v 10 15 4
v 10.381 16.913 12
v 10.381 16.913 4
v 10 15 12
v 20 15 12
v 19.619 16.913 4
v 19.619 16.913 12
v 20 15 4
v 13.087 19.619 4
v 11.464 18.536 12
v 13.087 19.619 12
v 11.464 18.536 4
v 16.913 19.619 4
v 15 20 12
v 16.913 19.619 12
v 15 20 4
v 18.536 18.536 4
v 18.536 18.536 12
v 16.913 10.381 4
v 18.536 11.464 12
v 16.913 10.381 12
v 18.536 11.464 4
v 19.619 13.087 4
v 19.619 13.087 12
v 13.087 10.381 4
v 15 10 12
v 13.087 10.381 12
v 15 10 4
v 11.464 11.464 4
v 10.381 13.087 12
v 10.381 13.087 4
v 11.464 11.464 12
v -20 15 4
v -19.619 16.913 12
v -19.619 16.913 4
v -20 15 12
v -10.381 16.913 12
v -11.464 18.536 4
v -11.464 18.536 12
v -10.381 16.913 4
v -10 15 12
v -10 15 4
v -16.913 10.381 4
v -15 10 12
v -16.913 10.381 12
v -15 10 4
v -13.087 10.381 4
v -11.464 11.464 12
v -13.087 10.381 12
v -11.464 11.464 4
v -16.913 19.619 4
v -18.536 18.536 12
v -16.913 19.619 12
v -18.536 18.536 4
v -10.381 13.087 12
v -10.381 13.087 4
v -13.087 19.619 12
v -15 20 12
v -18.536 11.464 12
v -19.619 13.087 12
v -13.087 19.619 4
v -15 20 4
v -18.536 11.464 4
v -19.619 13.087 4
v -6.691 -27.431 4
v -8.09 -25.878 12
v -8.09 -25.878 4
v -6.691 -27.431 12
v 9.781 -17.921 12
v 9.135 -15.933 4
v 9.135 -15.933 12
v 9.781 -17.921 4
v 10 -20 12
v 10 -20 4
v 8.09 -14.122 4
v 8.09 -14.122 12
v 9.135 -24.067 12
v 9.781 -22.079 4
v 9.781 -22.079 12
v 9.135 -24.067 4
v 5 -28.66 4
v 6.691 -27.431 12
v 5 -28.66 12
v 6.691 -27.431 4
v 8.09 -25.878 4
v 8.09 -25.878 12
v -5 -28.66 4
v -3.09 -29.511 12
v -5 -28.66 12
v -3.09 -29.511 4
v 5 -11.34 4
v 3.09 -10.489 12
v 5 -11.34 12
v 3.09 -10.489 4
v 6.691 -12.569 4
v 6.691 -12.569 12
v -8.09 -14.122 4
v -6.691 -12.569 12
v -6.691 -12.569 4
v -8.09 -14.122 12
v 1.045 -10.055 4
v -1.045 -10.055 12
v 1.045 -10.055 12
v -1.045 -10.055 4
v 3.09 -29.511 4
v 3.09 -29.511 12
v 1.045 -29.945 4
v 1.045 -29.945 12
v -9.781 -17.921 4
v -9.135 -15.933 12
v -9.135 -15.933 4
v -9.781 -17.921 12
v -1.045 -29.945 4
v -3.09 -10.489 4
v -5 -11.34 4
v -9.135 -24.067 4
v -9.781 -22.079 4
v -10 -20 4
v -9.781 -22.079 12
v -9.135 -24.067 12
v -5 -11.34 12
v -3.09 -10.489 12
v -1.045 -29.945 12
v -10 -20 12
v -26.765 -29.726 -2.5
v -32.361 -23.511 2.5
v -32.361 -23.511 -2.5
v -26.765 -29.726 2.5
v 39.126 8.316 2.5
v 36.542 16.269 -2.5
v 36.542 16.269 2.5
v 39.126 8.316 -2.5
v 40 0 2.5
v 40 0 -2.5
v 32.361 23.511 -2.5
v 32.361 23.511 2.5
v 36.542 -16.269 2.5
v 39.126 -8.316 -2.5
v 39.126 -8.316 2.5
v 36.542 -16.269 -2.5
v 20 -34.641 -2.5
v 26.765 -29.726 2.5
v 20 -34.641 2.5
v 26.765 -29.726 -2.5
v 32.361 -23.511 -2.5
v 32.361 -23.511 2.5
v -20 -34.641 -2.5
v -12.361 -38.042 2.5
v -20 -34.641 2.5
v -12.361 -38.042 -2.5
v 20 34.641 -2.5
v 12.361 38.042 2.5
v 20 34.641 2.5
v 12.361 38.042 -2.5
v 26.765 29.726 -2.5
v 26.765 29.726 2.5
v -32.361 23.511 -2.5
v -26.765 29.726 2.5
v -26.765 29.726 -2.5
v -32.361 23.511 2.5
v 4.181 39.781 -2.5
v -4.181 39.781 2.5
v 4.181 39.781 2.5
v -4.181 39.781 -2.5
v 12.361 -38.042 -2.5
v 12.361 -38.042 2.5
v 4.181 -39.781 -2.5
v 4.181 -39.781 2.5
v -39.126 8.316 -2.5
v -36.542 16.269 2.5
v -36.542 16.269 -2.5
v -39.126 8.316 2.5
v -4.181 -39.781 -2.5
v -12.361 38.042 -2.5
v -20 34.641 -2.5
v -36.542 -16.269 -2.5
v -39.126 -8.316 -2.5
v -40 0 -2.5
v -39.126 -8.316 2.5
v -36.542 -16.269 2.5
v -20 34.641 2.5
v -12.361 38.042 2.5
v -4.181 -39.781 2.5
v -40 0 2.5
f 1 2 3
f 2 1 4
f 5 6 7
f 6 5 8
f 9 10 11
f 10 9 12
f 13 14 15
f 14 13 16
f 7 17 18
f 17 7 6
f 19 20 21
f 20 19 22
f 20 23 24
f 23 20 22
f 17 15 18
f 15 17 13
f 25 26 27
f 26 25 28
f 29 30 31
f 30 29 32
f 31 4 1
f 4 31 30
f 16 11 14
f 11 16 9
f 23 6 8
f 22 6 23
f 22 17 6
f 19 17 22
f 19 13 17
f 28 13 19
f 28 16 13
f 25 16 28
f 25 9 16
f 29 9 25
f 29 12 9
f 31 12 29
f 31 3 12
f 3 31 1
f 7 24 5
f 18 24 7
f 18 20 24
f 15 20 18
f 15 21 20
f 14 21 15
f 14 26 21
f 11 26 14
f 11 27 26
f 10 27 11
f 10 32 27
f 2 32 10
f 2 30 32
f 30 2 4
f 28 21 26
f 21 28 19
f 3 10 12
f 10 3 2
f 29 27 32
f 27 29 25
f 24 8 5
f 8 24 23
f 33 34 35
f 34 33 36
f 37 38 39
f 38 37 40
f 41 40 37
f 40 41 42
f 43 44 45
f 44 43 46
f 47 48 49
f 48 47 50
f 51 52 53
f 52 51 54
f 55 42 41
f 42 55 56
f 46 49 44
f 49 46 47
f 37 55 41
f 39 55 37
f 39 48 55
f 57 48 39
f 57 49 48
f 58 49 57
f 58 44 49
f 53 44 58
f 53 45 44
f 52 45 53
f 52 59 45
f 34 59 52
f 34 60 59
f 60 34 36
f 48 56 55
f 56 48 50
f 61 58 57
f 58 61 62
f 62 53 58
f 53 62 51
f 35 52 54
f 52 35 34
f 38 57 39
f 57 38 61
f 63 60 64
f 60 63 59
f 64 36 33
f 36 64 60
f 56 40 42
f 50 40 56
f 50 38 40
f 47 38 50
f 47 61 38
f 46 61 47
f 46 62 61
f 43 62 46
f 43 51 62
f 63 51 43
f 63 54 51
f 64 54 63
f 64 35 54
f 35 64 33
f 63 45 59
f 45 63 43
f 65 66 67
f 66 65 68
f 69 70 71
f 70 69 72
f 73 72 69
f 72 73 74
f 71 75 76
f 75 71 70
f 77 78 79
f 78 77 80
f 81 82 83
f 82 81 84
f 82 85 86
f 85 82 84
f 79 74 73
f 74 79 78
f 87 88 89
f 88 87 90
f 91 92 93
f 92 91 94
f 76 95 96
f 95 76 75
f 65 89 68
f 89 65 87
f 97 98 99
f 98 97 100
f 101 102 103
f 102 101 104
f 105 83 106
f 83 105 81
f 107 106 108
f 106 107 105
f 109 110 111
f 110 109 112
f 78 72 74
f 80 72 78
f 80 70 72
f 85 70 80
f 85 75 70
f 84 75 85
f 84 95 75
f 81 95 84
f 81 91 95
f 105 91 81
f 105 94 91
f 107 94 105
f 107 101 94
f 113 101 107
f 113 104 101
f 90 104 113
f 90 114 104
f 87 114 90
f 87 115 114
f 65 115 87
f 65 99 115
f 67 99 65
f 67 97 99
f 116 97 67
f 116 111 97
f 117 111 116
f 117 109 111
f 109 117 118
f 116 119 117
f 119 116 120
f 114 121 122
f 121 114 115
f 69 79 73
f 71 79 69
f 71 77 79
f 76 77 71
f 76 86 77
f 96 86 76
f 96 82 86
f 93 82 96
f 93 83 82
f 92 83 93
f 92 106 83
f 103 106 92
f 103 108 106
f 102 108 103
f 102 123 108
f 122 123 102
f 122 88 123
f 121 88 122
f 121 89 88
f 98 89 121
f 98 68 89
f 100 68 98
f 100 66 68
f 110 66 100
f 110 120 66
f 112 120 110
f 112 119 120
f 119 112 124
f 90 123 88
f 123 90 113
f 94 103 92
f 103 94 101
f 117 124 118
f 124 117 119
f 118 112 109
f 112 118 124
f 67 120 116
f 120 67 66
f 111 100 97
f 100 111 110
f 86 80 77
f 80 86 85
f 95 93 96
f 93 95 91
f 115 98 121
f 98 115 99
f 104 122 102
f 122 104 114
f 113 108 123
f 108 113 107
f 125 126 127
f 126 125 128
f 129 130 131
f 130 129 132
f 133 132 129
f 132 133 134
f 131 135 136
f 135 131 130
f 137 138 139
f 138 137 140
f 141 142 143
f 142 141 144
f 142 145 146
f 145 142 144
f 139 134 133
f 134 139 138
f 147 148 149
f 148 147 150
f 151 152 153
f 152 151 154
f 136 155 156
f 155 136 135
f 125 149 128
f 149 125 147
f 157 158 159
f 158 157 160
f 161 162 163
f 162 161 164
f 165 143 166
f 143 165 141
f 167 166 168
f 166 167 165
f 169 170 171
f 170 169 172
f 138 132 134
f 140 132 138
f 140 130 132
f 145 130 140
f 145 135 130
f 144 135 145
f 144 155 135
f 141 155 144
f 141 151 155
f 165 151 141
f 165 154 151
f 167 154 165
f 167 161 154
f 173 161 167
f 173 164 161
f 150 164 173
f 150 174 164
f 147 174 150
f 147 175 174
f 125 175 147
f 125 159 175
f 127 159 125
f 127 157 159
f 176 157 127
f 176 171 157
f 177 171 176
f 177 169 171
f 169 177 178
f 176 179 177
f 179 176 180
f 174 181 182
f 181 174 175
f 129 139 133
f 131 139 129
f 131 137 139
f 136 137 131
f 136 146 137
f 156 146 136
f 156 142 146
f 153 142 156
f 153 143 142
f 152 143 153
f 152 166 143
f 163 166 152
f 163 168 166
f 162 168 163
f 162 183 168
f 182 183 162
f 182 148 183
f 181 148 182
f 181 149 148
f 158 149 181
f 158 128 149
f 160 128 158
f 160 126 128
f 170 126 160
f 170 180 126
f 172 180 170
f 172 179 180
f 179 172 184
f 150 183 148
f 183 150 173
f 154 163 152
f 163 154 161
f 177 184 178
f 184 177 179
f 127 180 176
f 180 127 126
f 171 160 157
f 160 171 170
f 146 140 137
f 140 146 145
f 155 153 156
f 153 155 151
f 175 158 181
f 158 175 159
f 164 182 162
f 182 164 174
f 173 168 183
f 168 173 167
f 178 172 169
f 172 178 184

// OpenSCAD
/*
Goal
Creating a tooth brush and tip stand
*/
// $fa = 1;
// $fs = 0.4;

brush_bot_rad = 5;
brush_bot_dep = 8;

handle_bot_rad = 10;
handle_bot_dep = 8;

base_rad = 40;
base_dep = 5;

translate([15,15,brush_bot_dep])
    cylinder(r=brush_bot_rad, h=brush_bot_dep, center=true);

translate([-15,15,brush_bot_dep])
    cylinder(r=brush_bot_rad, h=brush_bot_dep, center=true);
    
translate([0,-20,handle_bot_dep])
    cylinder(r=handle_bot_rad, h=handle_bot_dep, center=true);


scale([1, 1, 1])
    cylinder(r=base_rad, h=base_dep, center=true);



// dim1 = [100,80,20];
// x = 20;
// rad1 = 50;



// cube(size=dim1, center=true);

// translate([0, 0, 20])
//     cube(size=[x, 80, 20], center=true);

// translate([0, 0, 200]) 
//     rotate([90, 0, 50]) 
//     cylinder(r=20, h=100, center=true);
